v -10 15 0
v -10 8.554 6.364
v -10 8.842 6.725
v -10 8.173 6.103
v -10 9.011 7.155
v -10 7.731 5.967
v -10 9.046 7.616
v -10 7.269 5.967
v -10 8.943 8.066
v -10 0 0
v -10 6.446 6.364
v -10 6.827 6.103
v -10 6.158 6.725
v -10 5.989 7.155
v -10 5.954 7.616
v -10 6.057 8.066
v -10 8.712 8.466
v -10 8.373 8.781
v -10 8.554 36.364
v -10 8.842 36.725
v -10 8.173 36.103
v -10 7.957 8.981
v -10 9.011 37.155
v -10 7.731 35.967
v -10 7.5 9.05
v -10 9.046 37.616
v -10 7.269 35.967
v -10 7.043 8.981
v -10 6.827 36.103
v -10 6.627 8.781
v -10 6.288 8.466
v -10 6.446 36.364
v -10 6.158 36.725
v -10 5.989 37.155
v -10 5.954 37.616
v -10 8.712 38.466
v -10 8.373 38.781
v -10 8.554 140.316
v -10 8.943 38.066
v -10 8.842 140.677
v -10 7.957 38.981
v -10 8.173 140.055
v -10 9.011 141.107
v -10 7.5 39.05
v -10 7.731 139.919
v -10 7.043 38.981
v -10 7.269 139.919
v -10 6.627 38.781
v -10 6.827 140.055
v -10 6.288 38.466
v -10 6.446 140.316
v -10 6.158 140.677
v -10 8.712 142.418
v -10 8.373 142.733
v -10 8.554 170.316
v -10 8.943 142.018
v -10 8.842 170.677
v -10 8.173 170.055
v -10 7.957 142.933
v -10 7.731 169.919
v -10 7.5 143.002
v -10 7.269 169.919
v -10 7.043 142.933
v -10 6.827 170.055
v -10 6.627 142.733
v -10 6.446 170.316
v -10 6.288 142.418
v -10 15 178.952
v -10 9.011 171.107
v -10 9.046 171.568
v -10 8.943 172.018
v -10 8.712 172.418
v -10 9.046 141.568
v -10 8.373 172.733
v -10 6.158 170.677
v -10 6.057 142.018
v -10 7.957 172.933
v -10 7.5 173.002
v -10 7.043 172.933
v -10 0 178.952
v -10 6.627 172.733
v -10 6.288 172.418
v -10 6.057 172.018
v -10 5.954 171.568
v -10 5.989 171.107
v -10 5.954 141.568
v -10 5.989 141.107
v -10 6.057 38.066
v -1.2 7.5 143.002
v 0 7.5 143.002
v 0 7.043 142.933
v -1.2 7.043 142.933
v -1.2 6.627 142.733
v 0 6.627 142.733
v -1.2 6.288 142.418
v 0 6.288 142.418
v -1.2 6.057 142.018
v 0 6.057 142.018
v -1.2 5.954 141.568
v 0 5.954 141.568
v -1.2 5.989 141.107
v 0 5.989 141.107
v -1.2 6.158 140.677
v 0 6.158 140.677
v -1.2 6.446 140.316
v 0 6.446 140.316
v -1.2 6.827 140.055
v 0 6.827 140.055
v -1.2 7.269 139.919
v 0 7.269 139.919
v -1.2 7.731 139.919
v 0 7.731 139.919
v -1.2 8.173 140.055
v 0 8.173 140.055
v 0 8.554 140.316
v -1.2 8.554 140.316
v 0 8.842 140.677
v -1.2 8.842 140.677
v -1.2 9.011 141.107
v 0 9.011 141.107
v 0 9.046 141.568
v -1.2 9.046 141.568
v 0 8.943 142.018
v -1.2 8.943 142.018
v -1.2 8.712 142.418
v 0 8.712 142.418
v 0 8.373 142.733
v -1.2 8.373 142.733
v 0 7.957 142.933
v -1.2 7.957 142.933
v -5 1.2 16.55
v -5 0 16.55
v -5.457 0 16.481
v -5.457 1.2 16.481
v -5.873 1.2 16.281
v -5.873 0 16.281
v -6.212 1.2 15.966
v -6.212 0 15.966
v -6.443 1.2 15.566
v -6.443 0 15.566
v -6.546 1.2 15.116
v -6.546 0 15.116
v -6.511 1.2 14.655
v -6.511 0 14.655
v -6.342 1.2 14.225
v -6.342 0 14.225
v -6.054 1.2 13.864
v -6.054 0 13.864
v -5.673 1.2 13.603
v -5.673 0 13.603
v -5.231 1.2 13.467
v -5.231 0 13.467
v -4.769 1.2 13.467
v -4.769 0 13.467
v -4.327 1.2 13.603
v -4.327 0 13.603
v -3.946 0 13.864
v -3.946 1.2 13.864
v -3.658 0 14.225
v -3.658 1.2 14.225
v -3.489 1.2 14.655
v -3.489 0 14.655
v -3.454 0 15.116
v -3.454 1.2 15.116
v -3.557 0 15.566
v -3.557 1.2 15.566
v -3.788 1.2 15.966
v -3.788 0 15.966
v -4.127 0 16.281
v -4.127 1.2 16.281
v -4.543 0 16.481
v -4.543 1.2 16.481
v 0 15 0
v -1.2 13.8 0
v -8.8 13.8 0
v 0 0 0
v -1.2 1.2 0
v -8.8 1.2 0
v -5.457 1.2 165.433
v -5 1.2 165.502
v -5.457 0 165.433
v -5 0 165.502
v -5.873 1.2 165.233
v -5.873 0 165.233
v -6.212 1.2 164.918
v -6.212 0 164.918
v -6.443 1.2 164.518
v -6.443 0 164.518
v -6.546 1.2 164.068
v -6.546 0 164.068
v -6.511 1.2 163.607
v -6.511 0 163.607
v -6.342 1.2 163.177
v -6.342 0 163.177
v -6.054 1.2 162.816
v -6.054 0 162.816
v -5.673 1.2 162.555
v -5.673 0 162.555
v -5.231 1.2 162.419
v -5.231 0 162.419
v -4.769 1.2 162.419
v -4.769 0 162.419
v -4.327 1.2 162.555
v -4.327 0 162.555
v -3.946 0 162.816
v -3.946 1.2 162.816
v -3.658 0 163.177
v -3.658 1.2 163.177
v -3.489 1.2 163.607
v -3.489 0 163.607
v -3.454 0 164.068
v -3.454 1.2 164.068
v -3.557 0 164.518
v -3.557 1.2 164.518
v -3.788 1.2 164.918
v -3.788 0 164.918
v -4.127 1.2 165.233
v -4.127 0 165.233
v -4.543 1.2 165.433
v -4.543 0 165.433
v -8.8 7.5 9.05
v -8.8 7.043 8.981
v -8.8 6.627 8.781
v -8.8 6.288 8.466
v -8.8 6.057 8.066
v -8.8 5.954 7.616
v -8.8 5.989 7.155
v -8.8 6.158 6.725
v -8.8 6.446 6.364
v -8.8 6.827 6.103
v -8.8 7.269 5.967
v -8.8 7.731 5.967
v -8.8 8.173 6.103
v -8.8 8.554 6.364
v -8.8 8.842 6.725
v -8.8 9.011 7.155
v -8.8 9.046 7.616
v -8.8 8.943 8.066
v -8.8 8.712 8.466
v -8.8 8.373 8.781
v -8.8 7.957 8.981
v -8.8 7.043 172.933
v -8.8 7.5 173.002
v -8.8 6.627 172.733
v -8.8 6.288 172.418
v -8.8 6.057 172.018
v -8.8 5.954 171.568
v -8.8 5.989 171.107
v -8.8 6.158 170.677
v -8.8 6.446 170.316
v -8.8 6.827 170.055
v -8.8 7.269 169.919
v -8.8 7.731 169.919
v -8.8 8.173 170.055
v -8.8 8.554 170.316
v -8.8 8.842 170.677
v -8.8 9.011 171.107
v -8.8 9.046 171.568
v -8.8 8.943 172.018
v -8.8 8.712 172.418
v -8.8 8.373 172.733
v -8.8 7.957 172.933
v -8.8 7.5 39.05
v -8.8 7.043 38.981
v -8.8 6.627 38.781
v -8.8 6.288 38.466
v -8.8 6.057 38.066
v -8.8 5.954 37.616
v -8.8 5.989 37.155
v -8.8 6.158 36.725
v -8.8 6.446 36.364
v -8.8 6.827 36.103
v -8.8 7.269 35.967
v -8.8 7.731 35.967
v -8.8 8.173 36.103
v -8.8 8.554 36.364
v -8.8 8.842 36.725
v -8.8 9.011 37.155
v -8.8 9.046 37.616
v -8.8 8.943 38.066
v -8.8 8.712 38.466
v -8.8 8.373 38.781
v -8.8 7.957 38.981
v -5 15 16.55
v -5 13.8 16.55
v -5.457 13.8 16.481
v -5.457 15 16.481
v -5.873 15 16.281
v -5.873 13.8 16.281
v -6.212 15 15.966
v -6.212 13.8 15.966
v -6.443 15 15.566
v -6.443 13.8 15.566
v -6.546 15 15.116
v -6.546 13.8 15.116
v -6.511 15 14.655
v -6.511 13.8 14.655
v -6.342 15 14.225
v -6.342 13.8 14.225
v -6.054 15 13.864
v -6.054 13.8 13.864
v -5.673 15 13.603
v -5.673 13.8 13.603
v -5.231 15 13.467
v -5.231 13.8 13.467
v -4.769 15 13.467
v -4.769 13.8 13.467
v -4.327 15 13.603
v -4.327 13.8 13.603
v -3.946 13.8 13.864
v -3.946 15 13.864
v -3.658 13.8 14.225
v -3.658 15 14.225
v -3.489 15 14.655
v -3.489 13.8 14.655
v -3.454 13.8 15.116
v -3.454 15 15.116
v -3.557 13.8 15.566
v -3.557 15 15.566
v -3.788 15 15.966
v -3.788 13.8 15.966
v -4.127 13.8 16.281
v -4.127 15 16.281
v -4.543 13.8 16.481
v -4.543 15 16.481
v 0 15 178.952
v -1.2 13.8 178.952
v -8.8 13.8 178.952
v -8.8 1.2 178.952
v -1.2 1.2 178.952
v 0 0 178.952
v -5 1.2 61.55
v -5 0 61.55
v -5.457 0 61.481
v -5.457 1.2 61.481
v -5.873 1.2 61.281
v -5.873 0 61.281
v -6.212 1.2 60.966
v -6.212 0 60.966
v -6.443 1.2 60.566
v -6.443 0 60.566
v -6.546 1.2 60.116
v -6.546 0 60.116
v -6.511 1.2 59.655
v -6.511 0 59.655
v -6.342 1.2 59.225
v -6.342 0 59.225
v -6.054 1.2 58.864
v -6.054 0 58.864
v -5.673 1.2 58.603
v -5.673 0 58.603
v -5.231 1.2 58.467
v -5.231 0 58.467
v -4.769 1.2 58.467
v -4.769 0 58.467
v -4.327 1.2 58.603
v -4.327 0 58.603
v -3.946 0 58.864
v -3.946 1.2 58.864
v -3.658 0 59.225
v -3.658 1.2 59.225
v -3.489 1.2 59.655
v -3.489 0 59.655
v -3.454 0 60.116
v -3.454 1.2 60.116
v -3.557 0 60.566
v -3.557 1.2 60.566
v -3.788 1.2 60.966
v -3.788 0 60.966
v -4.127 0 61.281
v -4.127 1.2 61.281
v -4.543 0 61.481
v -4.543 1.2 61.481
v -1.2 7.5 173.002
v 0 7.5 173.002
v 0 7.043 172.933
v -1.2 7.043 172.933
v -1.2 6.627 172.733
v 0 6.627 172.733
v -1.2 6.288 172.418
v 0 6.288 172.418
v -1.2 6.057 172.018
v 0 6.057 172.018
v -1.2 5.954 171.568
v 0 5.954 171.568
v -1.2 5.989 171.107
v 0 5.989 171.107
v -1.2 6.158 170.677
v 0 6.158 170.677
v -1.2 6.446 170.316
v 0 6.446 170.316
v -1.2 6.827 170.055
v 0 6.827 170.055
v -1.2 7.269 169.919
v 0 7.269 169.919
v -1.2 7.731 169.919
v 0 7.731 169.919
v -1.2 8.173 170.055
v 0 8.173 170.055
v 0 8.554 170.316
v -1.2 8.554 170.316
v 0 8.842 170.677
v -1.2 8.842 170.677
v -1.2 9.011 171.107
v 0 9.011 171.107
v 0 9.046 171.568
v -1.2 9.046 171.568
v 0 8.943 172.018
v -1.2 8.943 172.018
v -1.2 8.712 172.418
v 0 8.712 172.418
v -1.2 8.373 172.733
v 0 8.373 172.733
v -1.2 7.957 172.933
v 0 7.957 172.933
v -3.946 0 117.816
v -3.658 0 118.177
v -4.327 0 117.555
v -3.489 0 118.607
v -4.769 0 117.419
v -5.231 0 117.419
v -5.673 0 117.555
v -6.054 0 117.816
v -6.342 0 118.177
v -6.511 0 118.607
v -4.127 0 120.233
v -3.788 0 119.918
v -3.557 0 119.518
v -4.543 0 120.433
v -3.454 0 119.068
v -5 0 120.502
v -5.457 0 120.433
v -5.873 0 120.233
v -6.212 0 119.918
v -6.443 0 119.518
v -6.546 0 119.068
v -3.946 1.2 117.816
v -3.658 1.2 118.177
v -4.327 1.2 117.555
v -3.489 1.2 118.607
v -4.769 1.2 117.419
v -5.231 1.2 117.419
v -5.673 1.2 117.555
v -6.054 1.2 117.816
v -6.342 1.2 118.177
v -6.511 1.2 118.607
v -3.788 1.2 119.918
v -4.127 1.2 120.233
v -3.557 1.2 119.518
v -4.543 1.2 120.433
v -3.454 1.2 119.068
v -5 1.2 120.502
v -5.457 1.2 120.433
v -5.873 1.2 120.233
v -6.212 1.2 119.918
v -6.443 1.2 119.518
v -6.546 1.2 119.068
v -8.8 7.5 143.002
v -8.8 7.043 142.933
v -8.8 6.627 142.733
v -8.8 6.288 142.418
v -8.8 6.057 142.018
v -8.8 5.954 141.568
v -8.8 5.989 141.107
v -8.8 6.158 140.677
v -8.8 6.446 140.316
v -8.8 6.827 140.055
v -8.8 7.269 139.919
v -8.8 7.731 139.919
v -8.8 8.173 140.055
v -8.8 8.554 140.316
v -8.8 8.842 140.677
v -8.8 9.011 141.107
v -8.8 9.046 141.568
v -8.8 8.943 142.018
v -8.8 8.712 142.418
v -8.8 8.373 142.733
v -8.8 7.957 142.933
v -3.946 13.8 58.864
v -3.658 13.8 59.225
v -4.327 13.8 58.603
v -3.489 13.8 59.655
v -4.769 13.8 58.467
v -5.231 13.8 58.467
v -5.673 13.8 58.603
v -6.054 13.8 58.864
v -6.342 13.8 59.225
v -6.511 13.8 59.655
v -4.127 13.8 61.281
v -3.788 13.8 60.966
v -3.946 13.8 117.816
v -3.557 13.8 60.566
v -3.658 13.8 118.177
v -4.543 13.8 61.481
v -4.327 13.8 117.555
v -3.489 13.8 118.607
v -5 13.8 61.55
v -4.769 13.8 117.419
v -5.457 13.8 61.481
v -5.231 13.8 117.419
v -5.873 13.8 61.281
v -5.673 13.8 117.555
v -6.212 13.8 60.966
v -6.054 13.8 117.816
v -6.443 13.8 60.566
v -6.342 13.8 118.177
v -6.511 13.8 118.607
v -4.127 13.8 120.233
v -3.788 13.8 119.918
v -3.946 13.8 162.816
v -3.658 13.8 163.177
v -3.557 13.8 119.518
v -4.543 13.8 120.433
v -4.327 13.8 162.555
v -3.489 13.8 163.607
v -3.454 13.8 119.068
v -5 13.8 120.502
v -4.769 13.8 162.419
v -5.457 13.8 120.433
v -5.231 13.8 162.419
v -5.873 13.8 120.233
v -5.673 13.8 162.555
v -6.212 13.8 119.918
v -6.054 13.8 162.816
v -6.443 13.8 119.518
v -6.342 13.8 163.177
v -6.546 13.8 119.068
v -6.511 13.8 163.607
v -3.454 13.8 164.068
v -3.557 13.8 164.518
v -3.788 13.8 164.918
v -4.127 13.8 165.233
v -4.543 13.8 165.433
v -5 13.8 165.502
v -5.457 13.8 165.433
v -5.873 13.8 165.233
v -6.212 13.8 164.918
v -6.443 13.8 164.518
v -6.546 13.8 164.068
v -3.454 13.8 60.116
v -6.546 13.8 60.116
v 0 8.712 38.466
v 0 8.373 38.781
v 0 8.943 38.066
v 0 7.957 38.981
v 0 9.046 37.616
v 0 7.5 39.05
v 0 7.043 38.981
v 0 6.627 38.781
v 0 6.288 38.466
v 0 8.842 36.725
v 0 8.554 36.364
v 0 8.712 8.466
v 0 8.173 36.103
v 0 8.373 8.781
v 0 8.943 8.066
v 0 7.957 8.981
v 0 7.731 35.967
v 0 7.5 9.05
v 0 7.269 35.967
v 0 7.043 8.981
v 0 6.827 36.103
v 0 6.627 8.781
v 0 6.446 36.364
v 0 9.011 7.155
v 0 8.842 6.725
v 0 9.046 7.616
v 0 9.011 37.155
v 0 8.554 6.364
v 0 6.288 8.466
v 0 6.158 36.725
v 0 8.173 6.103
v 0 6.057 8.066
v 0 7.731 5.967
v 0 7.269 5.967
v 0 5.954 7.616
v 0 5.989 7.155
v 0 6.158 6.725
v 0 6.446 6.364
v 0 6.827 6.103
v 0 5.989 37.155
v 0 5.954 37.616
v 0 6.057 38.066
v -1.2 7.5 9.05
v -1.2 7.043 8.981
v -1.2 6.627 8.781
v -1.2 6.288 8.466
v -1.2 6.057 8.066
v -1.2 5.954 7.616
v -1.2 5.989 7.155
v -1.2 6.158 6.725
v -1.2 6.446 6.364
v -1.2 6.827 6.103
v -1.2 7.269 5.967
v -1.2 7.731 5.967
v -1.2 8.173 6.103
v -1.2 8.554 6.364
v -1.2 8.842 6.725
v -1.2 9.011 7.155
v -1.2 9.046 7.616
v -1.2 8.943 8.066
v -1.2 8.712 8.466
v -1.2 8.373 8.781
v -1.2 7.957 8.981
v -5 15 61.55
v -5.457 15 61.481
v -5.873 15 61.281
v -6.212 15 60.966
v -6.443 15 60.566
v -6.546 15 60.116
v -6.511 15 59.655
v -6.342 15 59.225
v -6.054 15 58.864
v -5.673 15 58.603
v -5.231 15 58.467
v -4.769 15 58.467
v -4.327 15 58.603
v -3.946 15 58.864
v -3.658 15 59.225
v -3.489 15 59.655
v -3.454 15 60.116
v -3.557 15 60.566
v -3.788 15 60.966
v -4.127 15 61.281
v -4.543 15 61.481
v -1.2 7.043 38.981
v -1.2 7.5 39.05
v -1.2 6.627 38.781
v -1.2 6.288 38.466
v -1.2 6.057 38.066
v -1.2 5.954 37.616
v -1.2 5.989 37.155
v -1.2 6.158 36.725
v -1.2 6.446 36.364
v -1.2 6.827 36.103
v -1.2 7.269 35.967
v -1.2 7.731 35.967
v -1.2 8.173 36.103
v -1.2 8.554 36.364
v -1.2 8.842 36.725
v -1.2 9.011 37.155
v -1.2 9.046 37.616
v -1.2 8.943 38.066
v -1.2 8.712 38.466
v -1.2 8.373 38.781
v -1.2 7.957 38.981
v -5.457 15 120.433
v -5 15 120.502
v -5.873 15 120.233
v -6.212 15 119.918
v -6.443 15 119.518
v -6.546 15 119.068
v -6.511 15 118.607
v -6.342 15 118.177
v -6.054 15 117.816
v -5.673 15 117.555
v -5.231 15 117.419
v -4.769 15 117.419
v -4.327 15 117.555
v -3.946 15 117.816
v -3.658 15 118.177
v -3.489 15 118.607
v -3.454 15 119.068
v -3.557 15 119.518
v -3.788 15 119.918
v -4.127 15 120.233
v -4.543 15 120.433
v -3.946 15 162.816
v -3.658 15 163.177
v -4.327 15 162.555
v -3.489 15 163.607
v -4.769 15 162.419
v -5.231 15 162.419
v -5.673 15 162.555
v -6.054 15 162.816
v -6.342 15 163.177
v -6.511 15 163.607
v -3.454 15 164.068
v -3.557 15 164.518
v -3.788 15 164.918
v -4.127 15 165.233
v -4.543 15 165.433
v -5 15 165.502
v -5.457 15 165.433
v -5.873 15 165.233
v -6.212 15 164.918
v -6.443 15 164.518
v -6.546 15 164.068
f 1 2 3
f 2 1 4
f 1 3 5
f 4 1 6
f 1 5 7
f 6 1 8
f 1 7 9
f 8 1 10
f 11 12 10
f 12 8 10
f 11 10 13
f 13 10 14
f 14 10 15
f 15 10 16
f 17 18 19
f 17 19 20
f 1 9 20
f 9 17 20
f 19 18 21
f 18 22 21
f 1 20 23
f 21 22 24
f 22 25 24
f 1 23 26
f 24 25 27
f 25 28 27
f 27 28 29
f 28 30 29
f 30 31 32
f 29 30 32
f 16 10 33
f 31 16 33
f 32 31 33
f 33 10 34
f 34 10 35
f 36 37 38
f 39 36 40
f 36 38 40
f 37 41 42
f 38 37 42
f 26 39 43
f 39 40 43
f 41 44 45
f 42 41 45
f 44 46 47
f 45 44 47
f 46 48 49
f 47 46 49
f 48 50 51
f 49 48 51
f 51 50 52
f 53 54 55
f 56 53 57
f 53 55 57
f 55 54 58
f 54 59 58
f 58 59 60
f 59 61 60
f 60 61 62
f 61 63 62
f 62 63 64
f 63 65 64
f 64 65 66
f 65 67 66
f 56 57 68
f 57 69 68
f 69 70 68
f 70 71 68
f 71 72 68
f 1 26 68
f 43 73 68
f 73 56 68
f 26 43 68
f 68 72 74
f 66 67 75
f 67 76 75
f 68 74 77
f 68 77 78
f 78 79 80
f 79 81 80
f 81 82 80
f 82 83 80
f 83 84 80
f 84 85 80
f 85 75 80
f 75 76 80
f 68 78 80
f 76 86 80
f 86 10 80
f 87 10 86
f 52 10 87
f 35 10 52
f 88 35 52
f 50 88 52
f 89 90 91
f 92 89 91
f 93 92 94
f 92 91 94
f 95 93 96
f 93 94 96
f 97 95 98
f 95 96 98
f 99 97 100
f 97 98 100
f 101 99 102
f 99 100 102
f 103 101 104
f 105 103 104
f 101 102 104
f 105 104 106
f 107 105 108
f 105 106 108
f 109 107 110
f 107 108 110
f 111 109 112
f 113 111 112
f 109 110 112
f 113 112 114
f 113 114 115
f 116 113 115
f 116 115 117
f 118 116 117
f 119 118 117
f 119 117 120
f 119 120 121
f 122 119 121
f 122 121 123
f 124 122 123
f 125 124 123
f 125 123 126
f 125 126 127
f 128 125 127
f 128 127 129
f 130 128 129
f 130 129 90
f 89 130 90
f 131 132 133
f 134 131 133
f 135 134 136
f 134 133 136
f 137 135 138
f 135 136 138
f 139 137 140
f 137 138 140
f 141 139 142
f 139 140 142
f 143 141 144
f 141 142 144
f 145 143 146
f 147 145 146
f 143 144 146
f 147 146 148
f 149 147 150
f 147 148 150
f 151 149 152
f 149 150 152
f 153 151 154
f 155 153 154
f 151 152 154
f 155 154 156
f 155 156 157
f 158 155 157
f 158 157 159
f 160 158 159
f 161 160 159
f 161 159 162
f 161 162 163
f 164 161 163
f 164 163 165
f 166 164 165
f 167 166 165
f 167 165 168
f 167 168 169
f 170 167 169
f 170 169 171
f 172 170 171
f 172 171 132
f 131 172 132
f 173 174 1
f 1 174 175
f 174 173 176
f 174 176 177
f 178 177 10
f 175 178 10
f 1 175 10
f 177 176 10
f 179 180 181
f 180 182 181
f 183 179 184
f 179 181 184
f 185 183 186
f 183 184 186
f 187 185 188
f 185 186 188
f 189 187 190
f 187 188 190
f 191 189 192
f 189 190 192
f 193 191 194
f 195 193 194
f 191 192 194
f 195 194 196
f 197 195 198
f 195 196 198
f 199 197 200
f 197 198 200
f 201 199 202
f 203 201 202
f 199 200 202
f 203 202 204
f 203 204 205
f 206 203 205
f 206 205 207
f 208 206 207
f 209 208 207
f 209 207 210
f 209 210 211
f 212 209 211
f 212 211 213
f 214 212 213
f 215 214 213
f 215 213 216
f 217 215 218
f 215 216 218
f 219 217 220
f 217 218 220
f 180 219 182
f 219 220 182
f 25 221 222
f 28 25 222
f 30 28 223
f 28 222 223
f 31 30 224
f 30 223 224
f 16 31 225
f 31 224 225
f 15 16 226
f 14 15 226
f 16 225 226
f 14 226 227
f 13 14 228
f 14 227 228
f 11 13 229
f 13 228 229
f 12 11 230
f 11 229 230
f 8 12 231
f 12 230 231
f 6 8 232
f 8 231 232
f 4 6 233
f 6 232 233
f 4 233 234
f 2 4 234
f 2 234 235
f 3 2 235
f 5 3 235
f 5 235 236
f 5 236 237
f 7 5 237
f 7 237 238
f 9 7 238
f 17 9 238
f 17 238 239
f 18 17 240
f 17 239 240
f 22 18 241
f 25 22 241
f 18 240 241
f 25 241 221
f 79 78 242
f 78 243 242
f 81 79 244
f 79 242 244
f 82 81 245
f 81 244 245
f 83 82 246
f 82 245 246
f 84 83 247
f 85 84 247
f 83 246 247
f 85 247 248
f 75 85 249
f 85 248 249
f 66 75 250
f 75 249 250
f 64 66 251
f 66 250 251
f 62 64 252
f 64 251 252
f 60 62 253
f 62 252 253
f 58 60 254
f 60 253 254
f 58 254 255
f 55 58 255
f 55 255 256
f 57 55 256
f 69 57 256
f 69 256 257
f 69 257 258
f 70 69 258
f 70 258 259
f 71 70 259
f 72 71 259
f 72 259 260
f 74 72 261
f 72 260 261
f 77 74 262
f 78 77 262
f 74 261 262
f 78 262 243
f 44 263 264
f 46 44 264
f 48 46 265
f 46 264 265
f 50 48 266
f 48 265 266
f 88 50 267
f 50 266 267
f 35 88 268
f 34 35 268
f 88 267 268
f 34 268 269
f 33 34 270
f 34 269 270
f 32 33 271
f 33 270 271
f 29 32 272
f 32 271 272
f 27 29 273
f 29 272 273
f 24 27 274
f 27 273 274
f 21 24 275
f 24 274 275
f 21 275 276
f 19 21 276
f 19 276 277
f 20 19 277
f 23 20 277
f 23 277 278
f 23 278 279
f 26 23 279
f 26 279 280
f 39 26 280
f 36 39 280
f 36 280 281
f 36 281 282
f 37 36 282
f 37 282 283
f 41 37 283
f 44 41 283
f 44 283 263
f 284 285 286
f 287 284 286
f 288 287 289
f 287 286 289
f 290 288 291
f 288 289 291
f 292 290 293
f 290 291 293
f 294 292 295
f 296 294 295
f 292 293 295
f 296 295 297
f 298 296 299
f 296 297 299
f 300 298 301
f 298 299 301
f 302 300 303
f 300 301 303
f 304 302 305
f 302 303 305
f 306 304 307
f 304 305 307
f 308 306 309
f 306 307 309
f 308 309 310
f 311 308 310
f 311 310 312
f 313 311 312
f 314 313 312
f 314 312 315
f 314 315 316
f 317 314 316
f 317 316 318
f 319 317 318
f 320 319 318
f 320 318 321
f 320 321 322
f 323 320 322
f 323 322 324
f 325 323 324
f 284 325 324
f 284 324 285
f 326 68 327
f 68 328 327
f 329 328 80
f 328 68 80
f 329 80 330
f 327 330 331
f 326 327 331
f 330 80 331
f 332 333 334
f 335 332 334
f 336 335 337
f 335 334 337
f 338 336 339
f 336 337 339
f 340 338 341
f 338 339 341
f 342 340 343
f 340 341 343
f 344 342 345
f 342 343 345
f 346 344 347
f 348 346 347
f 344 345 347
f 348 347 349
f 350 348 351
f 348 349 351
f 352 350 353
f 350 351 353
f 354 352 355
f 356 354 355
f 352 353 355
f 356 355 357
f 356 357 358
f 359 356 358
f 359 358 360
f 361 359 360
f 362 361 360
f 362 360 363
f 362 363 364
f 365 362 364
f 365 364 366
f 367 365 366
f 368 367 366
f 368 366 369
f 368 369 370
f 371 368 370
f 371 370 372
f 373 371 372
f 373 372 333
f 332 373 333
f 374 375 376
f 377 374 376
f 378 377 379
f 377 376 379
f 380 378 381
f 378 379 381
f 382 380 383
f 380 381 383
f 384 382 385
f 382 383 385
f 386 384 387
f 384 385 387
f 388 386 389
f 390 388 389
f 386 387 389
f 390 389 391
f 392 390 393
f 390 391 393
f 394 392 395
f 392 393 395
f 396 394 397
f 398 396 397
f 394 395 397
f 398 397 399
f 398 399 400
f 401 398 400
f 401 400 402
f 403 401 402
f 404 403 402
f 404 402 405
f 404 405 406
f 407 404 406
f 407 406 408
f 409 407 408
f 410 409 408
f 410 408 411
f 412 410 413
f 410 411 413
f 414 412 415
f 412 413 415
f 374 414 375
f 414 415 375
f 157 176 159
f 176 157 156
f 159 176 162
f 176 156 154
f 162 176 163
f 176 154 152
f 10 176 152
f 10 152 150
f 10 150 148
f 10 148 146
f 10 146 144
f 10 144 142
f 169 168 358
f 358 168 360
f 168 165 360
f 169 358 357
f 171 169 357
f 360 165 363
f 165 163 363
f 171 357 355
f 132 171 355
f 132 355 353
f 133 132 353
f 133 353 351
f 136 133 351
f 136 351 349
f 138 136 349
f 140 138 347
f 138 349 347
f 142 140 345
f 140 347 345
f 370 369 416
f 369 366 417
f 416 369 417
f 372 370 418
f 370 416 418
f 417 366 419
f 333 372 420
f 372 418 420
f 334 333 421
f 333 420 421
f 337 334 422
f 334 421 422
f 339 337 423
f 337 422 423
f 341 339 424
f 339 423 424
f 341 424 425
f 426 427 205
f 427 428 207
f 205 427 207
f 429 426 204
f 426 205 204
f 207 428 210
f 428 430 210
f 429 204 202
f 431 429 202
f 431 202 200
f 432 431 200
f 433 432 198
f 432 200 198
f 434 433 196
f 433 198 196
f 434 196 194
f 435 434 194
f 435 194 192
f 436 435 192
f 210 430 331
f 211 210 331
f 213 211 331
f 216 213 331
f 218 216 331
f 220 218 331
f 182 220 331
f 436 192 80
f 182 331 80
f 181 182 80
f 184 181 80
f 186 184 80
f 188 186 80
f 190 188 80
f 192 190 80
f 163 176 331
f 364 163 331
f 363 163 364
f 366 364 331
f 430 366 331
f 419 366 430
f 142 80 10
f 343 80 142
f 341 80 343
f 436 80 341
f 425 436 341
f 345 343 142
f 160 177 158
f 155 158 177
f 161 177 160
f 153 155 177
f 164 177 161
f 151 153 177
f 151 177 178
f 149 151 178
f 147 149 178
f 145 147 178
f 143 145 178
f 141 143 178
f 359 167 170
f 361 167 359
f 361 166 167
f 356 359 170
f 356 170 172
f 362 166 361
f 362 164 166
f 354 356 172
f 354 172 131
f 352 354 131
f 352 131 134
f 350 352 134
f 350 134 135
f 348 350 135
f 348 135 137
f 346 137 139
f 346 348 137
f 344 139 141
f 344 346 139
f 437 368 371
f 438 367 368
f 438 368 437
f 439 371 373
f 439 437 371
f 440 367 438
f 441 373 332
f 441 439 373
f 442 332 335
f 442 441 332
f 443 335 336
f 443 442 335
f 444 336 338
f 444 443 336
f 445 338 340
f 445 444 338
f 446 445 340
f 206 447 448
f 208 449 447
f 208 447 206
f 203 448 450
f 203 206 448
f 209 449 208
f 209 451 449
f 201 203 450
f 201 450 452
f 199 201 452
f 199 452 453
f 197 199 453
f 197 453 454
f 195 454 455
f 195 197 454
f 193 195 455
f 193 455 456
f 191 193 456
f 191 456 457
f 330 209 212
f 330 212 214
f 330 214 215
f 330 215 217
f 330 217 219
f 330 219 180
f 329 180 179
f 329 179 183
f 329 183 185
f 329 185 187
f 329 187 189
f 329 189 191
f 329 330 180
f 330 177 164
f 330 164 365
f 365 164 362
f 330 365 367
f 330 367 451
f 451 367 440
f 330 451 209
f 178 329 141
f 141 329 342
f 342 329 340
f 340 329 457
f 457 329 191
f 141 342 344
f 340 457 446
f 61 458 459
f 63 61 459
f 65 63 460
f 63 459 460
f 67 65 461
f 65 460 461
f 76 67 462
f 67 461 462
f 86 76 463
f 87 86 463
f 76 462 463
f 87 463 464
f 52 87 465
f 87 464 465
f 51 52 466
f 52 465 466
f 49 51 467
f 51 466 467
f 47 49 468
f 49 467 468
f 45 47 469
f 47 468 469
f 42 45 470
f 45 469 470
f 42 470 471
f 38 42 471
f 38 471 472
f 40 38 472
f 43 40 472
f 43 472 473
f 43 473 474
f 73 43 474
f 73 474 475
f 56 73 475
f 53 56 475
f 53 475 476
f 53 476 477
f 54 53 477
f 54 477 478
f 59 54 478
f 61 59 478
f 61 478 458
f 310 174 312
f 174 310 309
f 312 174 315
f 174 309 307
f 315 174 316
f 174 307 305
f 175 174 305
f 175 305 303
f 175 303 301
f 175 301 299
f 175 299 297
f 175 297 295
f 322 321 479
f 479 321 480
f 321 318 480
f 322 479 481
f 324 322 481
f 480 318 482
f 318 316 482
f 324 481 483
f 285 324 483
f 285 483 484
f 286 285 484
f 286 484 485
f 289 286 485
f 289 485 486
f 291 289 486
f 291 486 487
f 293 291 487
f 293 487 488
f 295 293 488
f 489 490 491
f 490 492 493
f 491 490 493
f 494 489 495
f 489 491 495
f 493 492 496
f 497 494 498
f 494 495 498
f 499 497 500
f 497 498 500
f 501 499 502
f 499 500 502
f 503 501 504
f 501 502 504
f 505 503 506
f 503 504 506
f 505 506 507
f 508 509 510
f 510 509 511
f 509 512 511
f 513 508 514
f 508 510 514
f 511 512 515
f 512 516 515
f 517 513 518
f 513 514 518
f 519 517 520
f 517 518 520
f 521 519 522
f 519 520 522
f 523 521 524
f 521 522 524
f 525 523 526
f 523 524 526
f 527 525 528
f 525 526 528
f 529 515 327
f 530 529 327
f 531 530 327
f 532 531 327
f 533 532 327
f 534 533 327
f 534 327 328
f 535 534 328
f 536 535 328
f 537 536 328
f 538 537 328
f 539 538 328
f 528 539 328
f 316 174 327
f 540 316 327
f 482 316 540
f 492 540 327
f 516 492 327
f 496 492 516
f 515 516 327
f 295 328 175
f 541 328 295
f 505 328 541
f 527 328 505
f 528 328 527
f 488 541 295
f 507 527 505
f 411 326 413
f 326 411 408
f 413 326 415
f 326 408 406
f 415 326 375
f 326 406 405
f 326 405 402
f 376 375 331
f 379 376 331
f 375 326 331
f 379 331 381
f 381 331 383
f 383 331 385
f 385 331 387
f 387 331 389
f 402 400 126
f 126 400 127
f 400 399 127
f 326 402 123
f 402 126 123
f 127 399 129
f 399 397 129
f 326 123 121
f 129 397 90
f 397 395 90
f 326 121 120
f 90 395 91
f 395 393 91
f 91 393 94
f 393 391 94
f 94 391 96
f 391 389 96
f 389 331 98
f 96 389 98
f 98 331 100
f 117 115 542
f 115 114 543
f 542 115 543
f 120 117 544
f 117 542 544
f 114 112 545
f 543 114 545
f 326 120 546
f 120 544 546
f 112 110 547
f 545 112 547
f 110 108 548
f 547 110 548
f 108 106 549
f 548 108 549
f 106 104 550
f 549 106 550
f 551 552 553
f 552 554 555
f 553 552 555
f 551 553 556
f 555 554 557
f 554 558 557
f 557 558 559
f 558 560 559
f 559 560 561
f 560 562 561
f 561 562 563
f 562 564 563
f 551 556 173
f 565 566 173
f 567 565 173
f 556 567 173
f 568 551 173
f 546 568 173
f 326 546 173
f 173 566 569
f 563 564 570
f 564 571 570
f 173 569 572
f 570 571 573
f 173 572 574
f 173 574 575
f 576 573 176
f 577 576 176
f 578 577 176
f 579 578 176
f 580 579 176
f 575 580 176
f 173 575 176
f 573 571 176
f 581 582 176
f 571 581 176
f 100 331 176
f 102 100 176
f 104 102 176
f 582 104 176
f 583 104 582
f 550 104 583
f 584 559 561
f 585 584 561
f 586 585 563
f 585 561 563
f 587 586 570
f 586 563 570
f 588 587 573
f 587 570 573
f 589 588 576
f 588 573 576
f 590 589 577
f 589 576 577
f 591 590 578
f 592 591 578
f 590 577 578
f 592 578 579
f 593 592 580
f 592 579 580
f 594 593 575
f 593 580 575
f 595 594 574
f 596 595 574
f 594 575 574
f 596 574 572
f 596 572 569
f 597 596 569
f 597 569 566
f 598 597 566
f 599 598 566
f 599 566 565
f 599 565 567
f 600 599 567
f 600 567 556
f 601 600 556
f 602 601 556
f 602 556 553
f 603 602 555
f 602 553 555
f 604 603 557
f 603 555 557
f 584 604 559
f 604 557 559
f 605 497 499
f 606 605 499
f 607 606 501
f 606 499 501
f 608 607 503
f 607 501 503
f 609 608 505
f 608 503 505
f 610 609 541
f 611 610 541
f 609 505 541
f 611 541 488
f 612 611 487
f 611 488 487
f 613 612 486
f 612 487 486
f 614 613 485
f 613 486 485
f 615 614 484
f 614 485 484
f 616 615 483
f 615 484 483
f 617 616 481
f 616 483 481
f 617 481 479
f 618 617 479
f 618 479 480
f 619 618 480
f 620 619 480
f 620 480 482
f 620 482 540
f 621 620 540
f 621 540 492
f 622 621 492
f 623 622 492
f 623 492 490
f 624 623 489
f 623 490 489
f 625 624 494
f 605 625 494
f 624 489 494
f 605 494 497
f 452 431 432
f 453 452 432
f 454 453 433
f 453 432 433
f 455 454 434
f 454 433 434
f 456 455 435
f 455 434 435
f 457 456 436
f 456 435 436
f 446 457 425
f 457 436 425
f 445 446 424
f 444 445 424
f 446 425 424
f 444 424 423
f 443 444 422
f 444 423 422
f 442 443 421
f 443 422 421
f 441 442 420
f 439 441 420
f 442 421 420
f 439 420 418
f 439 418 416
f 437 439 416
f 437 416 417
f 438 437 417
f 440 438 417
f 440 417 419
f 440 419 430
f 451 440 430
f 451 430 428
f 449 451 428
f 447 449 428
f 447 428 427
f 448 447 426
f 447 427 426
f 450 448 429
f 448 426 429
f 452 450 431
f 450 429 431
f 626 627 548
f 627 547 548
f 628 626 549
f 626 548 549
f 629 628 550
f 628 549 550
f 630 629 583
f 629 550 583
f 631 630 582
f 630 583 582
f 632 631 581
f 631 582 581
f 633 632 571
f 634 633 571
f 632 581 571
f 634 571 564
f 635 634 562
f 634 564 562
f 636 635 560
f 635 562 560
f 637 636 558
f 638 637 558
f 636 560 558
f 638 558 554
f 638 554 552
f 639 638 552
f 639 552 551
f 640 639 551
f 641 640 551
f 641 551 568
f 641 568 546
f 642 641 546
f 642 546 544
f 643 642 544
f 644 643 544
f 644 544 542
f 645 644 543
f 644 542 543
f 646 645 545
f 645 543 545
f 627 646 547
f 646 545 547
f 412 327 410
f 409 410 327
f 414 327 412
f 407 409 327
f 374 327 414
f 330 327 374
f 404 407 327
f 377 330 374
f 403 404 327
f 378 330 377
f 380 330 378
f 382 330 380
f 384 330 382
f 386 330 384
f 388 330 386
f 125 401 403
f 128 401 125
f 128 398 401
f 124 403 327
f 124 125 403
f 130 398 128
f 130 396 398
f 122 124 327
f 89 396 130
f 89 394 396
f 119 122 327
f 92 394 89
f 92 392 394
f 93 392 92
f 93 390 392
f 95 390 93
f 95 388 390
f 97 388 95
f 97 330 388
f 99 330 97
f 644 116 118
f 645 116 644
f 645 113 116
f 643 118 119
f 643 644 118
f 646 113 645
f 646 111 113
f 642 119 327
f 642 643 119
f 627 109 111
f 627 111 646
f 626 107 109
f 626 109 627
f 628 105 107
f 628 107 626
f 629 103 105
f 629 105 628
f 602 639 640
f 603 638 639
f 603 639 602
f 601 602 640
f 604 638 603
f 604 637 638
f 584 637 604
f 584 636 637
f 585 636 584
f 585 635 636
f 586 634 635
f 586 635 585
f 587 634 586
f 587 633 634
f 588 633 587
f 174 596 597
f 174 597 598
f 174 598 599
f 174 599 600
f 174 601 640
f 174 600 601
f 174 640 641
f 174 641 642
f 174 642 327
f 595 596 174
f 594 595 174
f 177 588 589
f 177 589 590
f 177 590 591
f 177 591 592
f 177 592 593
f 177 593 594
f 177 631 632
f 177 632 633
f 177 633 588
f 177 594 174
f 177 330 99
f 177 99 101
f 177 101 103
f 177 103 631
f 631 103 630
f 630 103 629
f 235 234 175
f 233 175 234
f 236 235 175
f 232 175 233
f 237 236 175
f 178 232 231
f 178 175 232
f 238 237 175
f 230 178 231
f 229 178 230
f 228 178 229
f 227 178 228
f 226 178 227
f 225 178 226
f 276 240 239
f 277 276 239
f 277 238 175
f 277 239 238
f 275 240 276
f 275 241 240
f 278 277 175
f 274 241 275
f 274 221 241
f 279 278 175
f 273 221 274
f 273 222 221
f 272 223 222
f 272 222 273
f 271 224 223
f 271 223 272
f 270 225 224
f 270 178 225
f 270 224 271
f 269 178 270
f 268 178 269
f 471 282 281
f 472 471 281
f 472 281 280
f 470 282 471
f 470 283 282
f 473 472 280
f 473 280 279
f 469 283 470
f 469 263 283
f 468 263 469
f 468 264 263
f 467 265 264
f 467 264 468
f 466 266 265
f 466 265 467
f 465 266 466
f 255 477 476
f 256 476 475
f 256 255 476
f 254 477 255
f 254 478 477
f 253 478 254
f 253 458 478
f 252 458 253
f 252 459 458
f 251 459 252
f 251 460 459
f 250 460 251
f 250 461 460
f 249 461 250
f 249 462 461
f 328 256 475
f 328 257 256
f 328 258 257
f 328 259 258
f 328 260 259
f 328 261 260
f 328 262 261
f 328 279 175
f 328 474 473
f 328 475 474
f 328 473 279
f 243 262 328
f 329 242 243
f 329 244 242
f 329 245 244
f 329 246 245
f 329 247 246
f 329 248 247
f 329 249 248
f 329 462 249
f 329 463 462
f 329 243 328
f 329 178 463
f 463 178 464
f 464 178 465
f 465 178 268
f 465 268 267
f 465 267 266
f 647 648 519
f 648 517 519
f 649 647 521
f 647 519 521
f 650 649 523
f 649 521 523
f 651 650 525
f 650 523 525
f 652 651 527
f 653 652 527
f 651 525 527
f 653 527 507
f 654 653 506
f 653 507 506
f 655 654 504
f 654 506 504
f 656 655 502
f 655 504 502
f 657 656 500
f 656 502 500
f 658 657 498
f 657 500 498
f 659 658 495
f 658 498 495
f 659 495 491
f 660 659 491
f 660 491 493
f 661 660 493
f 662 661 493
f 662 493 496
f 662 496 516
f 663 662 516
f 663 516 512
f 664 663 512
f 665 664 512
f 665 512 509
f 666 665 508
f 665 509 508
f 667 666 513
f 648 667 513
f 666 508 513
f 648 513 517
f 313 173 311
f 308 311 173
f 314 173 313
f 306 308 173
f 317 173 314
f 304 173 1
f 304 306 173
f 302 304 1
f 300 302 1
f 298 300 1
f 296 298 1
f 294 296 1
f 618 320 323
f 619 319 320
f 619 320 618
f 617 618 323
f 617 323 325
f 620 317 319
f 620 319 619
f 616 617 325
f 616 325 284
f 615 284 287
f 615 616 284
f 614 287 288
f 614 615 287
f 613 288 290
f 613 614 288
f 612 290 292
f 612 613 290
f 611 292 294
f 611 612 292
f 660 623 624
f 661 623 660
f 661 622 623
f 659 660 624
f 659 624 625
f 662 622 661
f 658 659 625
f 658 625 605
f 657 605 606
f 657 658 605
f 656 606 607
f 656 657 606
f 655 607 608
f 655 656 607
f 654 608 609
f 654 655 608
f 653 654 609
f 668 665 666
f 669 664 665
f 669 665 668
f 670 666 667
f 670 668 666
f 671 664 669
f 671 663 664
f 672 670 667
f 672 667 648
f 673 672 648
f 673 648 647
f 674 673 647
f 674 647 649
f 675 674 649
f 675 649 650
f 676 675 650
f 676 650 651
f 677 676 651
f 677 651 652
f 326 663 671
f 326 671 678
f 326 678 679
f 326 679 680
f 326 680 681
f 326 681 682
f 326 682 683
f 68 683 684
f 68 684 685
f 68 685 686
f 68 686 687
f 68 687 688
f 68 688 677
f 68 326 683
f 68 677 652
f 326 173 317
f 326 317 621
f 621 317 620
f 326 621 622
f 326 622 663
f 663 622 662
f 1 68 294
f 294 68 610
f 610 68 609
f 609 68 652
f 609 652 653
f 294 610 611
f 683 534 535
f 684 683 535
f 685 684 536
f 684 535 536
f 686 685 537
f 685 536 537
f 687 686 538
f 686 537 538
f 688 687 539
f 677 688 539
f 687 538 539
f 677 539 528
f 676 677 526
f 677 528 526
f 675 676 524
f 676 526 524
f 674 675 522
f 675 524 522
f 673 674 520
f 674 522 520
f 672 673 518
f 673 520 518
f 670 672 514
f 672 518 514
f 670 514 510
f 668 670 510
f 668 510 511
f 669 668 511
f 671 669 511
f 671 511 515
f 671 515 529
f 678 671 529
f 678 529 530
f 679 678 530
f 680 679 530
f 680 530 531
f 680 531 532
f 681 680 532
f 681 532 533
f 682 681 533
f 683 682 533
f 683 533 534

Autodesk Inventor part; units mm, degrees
ref_plane "YZ Plane" through (0, 0, 0) normal (1, 0, 0) x (0, 1, 0)
ref_plane "XZ Plane" through (0, 0, 0) normal (0, 1, 0) x (-1, 0, 0)
ref_plane "XY Plane" through (0, 0, 0) normal (0, 0, 1) x (1, 0, 0)
sketch "スケッチ1" plane through (0, 0, 0) normal (0, 1, 0) x (-1, 0, 0)
  line L0 (0, 0) -> (10, 0)
  line L1 (10, 0) -> (10, 178.952)
  line L2 (10, 178.952) -> (0, 178.952)
  line L3 (0, 178.952) -> (0, 0)
  dimension "d0" = 10
  dimension "d1" = 178.952
extrude "押し出し1" add sketch "スケッチ1" along normal blind 15
shell "シェル1" thickness 1.2 removed faces 2 at (-3.3333, 5, 0) at (-6.6667, 5, 178.952)
sketch "スケッチ2" plane through (-10, 0, 0) normal (-1, 0, 0) x (0, 0, 1)
  line L0 (0, 1.2) -> (0, 13.8) projected
  line L1 (0, 7.5) -> (178.952, 7.5)
  line L2 (178.952, 1.2) -> (178.952, 13.8) projected
  point P0 (0, 0)
  point P1 (171.452, 7.5)
  point P2 (141.452, 7.5)
  point P3 (7.5, 7.5)
  point P4 (37.5, 7.5)
  dimension "d5" = 7.5
  dimension "d6" = 30
  dimension "d7" = 7.5
  dimension "d8" = 30
hole "穴1" at (-10, 7.5, 171.452) at (-10, 7.5, 141.452) at (-10, 7.5, 7.5) at (-10, 7.5, 37.5) direction (1, 0, 0) diameter 3.1 end through all
sketch "スケッチ3" plane through (0, 15, 0) normal (0, 1, 0) x (1, 0, 0)
  line L0 (0, 0) -> (-10, 0) projected
  line L1 (-5, 0) -> (-5, -178.952)
  line L2 (-10, -178.952) -> (0, -178.952) projected
  point P0 (-5, -15)
  point P1 (-5, -60)
  point P2 (-5, -163.952)
  point P3 (-5, -118.952)
  dimension "d16" = 15
  dimension "d17" = 45
  dimension "d18" = 15
  dimension "d19" = 45
hole "穴2" at (-5, 15, 15) at (-5, 15, 60) at (-5, 15, 163.952) at (-5, 15, 118.952) direction (0, -1, 0) diameter 3.1 end through all
sketch "スケッチ4" plane through (0, 15, 0) normal (0, 1, 0) x (1, 0, 0)
  circle A0 centre (-5, -118.952) radius 1.55 projected
  circle A1 centre (-5, -60) radius 1.55 projected
  line L0 (-5, -118.952) -> (-5, -60)
  line L1 (-5, -89.476) -> (-135, -89.476)
  circle A2 centre (-70, -90.476) radius 88
  line L2 (-70, -90.476) -> (-7.7746, -28.2506)
  line L3 (-5, -90.476) -> (-135, -90.476)
  point P0 (0, 0)
  point P1 (-132.2254, -28.2506)
  point P2 (-132.2254, -152.7014)
  point P3 (-7.7746, -152.7014)
  dimension "d30" = 176
  dimension "d27" = 130
  dimension "d34" = 360
  dimension "d47" = 1
hole "穴3" [suppressed]
properties part number "base_pipe1" material "アルミニウム 6061"
